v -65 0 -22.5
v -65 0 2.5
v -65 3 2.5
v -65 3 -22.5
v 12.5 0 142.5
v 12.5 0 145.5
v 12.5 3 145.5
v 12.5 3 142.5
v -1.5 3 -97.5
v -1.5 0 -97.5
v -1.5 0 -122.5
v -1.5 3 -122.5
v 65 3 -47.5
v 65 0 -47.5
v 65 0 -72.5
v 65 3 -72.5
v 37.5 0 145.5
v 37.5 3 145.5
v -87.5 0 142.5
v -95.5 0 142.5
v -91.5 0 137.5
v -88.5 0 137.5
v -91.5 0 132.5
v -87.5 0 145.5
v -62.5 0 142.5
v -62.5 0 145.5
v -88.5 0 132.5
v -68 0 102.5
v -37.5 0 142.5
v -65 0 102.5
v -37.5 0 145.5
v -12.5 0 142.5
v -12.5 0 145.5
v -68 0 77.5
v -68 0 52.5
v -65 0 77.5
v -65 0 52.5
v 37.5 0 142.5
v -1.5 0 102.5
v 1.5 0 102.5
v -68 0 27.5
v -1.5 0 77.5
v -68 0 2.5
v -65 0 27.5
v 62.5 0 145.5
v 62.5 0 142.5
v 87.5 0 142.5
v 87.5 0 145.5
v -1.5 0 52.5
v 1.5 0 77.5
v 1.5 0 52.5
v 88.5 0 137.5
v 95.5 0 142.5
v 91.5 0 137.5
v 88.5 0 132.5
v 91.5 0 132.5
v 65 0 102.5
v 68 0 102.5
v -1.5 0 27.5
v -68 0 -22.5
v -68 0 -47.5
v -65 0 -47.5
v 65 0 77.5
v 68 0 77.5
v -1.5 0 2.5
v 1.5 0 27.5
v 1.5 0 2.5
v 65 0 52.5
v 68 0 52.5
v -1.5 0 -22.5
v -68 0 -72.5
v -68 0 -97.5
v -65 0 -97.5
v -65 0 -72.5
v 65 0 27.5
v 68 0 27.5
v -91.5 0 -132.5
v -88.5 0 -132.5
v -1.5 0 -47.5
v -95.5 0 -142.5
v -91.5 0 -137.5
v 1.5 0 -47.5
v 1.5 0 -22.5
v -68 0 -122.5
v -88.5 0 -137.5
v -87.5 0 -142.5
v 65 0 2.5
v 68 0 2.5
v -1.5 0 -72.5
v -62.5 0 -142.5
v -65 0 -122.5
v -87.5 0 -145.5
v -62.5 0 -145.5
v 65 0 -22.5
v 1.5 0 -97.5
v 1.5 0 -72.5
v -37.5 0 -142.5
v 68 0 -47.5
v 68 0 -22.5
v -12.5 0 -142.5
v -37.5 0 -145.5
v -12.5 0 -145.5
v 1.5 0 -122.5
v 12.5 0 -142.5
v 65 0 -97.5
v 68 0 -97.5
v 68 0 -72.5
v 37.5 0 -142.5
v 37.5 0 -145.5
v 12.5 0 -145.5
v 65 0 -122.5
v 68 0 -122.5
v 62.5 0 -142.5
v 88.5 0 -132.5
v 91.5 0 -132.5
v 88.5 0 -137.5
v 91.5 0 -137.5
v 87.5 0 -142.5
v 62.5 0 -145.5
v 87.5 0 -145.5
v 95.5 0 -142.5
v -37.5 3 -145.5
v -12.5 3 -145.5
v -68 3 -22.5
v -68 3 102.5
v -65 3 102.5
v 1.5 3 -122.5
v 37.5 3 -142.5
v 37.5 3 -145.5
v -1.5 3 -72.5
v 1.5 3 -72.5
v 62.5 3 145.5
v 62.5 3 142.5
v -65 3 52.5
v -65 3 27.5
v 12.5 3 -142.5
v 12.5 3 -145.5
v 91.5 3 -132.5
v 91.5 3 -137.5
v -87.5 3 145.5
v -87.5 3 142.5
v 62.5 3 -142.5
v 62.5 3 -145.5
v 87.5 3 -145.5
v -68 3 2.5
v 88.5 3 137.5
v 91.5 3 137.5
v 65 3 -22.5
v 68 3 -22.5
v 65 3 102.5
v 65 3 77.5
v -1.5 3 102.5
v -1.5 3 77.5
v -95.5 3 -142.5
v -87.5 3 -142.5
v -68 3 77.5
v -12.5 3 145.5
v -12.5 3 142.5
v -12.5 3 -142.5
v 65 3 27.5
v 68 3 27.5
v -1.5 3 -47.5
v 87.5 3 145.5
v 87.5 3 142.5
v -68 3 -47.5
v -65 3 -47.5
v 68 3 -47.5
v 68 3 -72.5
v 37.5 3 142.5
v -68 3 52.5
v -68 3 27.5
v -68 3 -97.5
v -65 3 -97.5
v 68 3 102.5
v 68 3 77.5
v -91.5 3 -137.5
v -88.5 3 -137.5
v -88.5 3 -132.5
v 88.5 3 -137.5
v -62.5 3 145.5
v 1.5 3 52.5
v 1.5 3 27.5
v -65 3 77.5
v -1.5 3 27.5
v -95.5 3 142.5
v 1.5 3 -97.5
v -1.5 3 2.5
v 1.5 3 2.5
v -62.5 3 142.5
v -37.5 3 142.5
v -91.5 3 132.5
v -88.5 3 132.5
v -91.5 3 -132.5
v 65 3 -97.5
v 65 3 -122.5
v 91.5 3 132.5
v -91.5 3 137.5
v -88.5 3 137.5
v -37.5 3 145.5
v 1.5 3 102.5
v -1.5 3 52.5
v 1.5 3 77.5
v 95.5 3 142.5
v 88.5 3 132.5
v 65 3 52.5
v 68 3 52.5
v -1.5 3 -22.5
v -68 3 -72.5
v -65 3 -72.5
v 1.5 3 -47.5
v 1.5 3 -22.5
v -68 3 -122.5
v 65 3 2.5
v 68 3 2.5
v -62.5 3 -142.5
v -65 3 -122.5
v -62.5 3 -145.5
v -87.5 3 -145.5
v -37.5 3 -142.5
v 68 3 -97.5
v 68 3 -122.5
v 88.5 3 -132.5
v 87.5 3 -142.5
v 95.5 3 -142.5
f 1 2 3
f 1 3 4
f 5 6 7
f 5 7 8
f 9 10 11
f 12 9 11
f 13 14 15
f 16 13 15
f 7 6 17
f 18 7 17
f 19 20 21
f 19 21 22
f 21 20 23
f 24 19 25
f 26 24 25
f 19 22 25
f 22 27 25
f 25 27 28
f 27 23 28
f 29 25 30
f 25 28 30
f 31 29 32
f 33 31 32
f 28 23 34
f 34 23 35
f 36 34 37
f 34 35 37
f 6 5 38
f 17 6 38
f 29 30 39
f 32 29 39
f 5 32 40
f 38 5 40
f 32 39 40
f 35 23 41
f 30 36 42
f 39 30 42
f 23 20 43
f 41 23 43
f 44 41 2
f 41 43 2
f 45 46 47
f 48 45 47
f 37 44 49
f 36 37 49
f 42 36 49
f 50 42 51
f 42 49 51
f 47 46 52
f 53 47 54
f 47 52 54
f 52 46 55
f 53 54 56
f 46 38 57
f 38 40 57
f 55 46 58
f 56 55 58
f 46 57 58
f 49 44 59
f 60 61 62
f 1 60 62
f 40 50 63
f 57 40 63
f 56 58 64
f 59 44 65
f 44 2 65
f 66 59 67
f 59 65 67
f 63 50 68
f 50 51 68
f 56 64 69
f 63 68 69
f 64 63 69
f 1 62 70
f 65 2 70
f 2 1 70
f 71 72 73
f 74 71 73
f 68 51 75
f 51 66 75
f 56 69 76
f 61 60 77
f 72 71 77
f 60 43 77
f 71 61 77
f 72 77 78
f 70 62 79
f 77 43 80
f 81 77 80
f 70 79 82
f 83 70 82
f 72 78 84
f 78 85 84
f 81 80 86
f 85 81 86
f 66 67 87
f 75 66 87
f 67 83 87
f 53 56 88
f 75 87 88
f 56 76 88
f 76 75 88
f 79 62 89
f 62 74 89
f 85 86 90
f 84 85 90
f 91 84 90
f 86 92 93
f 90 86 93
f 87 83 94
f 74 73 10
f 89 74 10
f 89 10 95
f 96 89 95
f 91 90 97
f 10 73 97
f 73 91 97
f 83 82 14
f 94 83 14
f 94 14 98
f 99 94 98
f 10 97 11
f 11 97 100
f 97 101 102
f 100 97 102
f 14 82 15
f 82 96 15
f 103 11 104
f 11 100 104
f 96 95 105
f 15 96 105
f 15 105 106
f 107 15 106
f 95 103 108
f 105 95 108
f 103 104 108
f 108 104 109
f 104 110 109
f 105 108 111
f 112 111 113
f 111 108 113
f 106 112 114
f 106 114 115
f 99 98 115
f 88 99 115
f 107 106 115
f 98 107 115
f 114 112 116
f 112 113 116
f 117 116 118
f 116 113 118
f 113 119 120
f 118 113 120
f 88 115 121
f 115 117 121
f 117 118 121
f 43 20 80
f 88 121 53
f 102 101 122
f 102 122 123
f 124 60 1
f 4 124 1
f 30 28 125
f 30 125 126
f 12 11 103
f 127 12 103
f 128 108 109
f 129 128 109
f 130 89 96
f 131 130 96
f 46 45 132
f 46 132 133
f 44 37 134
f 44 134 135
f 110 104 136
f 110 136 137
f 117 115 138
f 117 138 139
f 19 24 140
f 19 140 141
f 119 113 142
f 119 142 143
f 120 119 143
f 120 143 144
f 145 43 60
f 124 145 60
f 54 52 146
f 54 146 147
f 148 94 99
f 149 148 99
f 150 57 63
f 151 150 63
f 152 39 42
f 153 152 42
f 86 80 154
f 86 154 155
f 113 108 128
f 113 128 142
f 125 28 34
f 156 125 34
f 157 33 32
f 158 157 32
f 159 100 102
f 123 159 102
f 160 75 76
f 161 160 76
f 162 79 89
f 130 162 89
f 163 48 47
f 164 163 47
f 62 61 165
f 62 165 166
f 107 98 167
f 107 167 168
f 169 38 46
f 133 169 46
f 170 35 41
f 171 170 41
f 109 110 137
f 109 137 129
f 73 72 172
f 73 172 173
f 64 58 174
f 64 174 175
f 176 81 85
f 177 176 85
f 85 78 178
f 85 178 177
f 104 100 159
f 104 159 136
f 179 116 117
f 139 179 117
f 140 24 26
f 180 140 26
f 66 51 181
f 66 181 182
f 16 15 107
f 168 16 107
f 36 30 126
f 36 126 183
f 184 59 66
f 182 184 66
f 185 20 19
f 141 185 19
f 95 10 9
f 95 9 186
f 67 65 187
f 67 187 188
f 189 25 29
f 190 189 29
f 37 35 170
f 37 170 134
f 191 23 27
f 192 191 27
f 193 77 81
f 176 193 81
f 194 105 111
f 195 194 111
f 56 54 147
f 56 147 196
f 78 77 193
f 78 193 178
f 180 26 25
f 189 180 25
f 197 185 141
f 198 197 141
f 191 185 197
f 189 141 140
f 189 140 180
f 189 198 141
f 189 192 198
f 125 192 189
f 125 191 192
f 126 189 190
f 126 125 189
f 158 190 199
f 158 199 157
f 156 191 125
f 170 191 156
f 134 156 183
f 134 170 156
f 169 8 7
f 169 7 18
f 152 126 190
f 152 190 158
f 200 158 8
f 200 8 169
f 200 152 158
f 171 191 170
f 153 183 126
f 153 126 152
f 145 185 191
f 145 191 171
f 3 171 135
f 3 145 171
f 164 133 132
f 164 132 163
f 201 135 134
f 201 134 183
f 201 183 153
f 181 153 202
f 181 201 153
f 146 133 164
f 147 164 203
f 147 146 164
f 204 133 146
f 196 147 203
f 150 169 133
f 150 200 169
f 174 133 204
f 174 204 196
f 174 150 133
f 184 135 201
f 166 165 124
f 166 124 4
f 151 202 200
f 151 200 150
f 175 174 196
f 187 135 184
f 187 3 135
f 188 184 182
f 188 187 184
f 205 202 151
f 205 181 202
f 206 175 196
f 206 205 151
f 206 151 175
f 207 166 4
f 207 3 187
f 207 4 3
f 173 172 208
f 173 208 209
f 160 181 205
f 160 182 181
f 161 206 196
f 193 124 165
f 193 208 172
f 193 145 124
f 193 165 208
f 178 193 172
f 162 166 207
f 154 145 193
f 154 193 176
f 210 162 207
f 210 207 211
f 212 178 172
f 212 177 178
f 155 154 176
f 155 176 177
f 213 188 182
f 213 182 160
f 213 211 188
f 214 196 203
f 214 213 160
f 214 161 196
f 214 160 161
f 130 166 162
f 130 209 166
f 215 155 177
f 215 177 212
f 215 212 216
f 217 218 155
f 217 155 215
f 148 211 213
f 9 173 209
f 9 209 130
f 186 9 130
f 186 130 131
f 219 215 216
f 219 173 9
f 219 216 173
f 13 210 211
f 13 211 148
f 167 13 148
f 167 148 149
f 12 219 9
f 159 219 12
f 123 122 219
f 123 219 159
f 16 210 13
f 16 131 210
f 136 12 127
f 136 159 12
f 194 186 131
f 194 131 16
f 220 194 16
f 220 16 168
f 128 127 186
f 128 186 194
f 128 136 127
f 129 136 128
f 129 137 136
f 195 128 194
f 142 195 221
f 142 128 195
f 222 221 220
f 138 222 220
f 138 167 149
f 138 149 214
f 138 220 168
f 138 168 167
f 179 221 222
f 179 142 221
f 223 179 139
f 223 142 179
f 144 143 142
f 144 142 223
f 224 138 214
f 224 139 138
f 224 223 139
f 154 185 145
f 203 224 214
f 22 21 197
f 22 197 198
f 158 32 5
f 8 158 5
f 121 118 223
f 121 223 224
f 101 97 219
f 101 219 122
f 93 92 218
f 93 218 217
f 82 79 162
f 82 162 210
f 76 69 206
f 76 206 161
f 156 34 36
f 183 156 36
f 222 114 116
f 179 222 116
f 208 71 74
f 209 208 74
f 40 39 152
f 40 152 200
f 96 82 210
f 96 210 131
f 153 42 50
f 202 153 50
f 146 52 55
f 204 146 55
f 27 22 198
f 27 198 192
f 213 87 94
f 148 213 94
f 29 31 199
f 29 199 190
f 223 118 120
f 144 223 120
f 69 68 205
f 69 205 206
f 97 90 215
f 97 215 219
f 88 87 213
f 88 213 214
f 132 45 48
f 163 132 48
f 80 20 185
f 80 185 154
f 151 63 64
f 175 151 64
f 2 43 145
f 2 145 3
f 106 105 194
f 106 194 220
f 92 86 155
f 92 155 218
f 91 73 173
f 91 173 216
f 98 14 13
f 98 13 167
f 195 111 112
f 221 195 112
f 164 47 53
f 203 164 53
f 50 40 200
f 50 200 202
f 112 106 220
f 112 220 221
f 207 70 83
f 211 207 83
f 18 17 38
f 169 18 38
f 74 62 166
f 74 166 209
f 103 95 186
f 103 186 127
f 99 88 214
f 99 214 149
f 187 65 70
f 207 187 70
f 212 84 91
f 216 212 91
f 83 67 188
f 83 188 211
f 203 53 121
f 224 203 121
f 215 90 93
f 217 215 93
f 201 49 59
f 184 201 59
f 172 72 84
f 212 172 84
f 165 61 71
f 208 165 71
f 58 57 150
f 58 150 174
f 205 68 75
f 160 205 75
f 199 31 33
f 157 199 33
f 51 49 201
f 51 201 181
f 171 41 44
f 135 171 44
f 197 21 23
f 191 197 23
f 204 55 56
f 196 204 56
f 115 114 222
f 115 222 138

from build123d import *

# Parameters (mm, degrees)
SKICA1_W                 = 191
SKICA1_H                 = 285
P_IDAT_VYSUNUT_M1_DEPTH  = 3
SKICA7_W                 = 25
SKICA7_H                 = 3
P_IDAT_VYSUNUT_M2_DEPTH  = 3
SKICA6_W                 = 3
SKICA6_H                 = 5
ODEBRAT_VYSUNUT_M6_DEPTH = 175.067515637
SKICA4_W                 = 3
SKICA4_H                 = 25
ODEBRAT_VYSUNUT_M3_DEPTH = 175.067515637


with BuildPart() as part:
    # Skica1 → Přidat vysunutím1 (new body)
    with BuildSketch(Plane(origin=(0, 0, 0), x_dir=(1, 0, 0), z_dir=(0, 1, 0))):
        Rectangle(SKICA1_W, SKICA1_H)
    extrude(amount=P_IDAT_VYSUNUT_M1_DEPTH)

    # Skica7 → Přidat vysunutím2 (add)
    with BuildSketch(Plane(origin=(0, 0, 0), x_dir=(1, 0, 0), z_dir=(0, 1, 0))):
        with Locations((-75, -144)):
            Rectangle(SKICA7_W, SKICA7_H)
        with Locations((-25, -144)):
            Rectangle(SKICA7_W, SKICA7_H)
        with Locations((25, -144)):
            Rectangle(SKICA7_W, SKICA7_H)
        with Locations((75, -144)):
            Rectangle(SKICA7_W, SKICA7_H)
        with Locations((75, 144)):
            Rectangle(SKICA7_W, SKICA7_H)
        with Locations((25, 144)):
            Rectangle(SKICA7_W, SKICA7_H)
        with Locations((-25, 144)):
            Rectangle(SKICA7_W, SKICA7_H)
        with Locations((-75, 144)):
            Rectangle(SKICA7_W, SKICA7_H)
    extrude(amount=P_IDAT_VYSUNUT_M2_DEPTH)

    # Skica6 → Odebrat vysunutím6 (cut, through all)
    with BuildSketch(Plane(origin=(0, 0, 0), x_dir=(1, 0, 0), z_dir=(0, 1, 0))):
        with Locations((-90, -135)):
            Rectangle(SKICA6_W, SKICA6_H)
        with Locations((90, -135)):
            Rectangle(SKICA6_W, SKICA6_H)
        with Locations((90, 135)):
            Rectangle(SKICA6_W, SKICA6_H)
        with Locations((-90, 135)):
            Rectangle(SKICA6_W, SKICA6_H)
    extrude(amount=ODEBRAT_VYSUNUT_M6_DEPTH, mode=Mode.SUBTRACT)

    # Skica4 → Odebrat vysunutím3 (cut, through all)
    with BuildSketch(Plane(origin=(0, 0, 0), x_dir=(1, 0, 0), z_dir=(0, 1, 0))):
        with Locations((-66.5, 110)):
            Rectangle(SKICA4_W, SKICA4_H)
        with Locations((0, 110)):
            Rectangle(SKICA4_W, SKICA4_H)
        with Locations((66.5, 110)):
            Rectangle(SKICA4_W, SKICA4_H)
        with Locations((66.5, 60)):
            Rectangle(SKICA4_W, SKICA4_H)
        with Locations((0, 60)):
            Rectangle(SKICA4_W, SKICA4_H)
        with Locations((-66.5, 60)):
            Rectangle(SKICA4_W, SKICA4_H)
        with Locations((66.5, 10)):
            Rectangle(SKICA4_W, SKICA4_H)
        with Locations((0, 10)):
            Rectangle(SKICA4_W, SKICA4_H)
        with Locations((-66.5, 10)):
            Rectangle(SKICA4_W, SKICA4_H)
        with Locations((66.5, -40)):
            Rectangle(SKICA4_W, SKICA4_H)
        with Locations((0, -40)):
            Rectangle(SKICA4_W, SKICA4_H)
        with Locations((-66.5, -40)):
            Rectangle(SKICA4_W, SKICA4_H)
        with Locations((66.5, -90)):
            Rectangle(SKICA4_W, SKICA4_H)
        with Locations((0, -90)):
            Rectangle(SKICA4_W, SKICA4_H)
        with Locations((-66.5, -90)):
            Rectangle(SKICA4_W, SKICA4_H)
    extrude(amount=ODEBRAT_VYSUNUT_M3_DEPTH, mode=Mode.SUBTRACT)


solid = part.part
